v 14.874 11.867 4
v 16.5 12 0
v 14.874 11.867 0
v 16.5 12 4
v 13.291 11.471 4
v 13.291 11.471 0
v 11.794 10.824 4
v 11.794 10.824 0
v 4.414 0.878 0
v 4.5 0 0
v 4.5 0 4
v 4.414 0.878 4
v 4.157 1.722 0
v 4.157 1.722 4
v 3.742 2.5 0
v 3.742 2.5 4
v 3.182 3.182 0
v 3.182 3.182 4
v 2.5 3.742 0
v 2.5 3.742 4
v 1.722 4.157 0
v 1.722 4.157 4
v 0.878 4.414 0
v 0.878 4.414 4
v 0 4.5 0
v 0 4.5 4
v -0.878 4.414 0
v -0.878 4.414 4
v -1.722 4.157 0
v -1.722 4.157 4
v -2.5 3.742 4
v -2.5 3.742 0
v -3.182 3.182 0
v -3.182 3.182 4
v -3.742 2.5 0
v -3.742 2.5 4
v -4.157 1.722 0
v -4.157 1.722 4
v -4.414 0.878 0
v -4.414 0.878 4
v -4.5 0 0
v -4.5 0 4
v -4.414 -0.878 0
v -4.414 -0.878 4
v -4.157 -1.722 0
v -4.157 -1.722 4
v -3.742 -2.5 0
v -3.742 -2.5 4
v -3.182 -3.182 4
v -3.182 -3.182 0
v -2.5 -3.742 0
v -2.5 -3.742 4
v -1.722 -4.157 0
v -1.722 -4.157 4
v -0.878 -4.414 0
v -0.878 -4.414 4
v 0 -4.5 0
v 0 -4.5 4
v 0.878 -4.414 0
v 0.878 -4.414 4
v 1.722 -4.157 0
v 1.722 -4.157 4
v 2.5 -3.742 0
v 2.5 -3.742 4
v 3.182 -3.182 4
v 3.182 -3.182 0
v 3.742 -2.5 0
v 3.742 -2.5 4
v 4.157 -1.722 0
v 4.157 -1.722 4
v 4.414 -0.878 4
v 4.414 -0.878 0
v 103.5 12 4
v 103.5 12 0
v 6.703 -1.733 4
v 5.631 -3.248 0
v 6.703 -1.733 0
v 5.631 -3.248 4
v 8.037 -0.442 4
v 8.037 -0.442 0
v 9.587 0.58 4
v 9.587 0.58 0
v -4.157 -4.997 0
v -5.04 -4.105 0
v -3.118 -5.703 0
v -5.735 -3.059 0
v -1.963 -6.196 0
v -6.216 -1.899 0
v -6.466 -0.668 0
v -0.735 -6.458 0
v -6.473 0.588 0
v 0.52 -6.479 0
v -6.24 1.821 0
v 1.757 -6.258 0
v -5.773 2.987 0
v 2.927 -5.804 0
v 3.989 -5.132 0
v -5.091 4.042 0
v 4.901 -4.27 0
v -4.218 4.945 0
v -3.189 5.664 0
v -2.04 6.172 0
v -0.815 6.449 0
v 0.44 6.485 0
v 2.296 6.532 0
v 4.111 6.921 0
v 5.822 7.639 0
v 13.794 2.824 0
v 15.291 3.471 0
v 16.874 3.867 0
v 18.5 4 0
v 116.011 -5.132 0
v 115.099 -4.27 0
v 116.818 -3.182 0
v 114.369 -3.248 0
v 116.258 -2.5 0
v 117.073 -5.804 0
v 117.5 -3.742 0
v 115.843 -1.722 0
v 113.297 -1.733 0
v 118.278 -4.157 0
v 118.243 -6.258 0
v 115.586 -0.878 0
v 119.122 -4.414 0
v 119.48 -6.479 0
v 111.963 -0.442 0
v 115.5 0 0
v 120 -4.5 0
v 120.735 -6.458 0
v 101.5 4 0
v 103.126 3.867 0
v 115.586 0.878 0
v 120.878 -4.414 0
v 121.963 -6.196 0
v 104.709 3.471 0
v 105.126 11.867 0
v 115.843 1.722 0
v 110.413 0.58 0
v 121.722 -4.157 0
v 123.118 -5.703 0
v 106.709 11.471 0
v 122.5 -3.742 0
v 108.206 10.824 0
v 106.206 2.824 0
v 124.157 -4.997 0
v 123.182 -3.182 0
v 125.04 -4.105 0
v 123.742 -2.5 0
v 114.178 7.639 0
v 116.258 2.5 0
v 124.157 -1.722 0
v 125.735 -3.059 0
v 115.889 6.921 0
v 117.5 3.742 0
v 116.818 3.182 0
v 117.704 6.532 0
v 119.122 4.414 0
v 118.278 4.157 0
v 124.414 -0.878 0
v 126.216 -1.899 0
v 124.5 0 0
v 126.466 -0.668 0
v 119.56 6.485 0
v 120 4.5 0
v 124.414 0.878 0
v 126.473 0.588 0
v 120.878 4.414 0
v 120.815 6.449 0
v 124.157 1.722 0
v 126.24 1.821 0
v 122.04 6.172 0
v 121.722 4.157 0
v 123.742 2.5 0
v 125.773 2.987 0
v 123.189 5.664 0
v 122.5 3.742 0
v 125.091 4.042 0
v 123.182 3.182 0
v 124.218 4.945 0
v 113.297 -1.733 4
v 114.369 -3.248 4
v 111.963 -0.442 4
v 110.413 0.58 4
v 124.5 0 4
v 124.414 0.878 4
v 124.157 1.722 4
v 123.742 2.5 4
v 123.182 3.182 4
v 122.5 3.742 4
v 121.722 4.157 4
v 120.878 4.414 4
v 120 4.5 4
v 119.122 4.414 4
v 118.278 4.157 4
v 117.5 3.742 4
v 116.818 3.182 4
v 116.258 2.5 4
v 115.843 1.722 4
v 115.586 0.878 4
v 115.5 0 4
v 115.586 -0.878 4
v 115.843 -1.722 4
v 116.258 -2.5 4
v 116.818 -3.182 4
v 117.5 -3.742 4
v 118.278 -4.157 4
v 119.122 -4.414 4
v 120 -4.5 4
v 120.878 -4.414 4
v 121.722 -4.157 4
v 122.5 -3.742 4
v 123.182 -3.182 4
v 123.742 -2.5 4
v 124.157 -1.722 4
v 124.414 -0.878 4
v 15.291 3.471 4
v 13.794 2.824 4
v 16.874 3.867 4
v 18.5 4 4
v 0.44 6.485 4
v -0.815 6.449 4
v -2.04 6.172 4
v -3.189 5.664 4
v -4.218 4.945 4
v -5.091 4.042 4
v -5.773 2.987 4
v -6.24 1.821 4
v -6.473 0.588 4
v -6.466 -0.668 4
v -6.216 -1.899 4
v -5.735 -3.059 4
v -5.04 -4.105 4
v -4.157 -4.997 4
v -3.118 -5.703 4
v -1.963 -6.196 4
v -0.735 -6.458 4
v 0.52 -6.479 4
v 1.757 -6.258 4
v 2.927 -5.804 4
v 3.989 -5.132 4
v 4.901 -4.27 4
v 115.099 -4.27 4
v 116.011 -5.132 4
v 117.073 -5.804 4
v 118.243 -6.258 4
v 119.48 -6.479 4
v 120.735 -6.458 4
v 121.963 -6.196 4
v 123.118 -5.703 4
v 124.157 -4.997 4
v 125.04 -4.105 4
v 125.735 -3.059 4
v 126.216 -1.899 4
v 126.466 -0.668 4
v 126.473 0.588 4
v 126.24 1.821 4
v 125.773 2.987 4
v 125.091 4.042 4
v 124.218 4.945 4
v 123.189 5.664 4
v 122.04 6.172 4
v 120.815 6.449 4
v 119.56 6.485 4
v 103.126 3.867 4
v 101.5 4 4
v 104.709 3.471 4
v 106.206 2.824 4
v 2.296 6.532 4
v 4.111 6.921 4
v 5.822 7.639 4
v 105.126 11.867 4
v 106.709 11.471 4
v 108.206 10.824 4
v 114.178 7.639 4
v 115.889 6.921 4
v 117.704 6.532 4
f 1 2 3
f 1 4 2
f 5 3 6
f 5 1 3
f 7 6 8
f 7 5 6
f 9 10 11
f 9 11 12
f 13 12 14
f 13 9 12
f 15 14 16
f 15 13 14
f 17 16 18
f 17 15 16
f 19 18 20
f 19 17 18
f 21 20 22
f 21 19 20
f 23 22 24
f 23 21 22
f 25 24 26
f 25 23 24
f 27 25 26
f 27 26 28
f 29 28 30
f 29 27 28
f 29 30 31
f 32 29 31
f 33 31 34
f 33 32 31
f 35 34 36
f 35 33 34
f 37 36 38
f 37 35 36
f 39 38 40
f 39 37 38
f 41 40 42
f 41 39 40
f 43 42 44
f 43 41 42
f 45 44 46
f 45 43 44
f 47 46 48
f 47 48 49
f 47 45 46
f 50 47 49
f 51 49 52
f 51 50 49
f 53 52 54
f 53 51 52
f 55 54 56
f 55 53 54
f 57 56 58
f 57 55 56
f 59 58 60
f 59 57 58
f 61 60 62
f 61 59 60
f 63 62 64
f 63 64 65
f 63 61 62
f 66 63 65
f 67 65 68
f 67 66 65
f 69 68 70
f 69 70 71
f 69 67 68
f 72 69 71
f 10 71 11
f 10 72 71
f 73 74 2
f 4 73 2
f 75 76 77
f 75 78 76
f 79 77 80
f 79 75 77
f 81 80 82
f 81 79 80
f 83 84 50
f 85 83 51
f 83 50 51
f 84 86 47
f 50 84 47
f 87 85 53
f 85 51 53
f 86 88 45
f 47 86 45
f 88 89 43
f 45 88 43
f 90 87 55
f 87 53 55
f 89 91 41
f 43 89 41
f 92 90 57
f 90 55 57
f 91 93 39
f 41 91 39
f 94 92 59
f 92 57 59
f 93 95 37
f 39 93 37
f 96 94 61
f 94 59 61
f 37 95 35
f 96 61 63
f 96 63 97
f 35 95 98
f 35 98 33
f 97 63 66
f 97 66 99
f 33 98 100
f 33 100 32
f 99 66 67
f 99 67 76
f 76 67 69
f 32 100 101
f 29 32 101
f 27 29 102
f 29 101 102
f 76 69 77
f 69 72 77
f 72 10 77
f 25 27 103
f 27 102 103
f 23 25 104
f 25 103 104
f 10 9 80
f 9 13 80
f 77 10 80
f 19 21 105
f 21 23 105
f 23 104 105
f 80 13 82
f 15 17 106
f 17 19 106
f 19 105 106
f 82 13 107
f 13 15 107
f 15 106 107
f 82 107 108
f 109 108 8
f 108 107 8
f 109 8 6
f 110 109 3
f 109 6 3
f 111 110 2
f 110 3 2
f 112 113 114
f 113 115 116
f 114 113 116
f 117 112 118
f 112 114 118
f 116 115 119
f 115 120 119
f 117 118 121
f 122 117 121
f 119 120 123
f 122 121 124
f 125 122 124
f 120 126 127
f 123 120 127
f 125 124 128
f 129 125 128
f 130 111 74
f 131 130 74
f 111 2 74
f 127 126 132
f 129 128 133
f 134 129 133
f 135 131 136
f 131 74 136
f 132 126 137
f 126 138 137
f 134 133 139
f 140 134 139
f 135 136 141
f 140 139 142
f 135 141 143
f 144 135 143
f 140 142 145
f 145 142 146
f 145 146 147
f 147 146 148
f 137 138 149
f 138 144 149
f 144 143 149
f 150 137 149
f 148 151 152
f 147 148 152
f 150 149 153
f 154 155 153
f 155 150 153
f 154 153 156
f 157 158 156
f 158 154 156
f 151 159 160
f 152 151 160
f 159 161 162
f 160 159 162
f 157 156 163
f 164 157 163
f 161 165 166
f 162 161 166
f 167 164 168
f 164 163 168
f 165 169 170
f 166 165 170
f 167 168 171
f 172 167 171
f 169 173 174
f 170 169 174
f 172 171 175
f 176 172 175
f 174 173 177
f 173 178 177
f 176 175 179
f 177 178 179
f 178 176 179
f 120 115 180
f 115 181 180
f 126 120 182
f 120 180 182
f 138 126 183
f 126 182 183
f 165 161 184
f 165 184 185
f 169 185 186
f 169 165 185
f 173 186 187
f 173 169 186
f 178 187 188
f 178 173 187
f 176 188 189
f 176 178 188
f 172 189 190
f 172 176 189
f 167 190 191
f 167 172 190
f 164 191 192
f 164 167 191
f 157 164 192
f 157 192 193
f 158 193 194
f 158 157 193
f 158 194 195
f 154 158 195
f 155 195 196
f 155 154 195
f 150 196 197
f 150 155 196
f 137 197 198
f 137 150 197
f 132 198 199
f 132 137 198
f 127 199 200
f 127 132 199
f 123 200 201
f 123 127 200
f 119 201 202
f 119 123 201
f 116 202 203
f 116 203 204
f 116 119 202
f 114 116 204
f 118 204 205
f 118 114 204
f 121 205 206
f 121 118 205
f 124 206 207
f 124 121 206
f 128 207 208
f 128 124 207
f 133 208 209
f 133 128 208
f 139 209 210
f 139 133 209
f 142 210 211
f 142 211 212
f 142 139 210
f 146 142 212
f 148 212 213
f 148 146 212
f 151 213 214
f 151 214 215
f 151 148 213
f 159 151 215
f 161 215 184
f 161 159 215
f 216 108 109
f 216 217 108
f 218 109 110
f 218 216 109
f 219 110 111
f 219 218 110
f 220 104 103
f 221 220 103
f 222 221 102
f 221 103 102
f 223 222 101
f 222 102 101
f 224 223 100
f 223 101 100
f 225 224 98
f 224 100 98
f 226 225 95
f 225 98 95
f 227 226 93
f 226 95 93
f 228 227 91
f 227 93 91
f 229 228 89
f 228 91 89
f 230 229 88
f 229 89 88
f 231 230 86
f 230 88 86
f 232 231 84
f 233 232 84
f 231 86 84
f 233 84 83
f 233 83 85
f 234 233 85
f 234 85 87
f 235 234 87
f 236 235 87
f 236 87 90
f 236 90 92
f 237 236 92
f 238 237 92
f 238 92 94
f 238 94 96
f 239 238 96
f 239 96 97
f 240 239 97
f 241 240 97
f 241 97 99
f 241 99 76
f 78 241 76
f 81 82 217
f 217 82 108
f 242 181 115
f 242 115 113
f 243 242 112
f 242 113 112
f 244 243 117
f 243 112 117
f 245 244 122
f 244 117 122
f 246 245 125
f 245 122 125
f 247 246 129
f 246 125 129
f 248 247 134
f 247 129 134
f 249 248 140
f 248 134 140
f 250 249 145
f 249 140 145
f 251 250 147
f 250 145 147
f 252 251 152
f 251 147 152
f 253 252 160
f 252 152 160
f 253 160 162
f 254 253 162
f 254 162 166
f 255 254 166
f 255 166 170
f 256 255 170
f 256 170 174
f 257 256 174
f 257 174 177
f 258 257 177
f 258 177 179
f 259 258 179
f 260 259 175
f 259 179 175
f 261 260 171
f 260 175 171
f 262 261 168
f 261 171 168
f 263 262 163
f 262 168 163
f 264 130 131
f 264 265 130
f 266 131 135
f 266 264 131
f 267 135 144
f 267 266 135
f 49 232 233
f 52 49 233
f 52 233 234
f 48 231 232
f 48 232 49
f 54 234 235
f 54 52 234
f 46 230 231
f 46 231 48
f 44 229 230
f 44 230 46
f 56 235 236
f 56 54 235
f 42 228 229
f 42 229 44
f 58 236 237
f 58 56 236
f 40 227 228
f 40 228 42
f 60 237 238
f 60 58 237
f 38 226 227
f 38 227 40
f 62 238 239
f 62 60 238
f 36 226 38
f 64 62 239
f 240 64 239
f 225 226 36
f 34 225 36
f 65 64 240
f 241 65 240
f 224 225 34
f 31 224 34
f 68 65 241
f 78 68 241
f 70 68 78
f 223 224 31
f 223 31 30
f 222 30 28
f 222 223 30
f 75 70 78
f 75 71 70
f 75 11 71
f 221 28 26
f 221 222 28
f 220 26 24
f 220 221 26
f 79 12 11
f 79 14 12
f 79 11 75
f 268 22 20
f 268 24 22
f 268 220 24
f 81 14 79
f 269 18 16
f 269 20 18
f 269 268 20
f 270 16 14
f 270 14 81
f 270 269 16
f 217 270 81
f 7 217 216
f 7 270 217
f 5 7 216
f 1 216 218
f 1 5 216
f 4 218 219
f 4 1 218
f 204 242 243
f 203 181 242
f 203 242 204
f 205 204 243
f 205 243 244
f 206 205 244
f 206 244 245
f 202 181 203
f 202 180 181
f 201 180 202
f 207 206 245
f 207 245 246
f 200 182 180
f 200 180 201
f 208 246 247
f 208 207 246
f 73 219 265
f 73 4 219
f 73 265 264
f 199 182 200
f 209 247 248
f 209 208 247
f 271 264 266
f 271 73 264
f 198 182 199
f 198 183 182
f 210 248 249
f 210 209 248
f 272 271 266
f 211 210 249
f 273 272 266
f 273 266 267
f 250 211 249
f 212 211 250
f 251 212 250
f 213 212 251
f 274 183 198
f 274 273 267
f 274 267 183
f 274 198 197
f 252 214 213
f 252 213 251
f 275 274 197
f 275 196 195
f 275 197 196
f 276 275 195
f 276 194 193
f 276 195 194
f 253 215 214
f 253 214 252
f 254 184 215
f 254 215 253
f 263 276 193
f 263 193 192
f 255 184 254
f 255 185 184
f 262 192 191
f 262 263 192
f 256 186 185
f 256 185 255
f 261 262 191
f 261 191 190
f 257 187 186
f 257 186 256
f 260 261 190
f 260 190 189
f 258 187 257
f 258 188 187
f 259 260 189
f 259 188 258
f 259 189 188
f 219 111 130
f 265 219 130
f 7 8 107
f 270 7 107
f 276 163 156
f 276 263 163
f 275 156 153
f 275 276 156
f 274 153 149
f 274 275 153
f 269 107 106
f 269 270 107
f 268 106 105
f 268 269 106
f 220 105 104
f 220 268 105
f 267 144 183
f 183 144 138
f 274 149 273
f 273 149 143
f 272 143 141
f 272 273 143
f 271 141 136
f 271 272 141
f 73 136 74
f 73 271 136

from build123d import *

# Parameters (mm, degrees)
SKETCH1_R           = 6.5
SKETCH1_R_2         = 4.5
BOSS_EXTRUDE1_DEPTH = 4
FILLET1_R           = 10


with BuildPart() as part:
    # Sketch1 → Boss-Extrude1 (new body)
    # profile 1 of 3: a face of its own
    with BuildSketch(Plane.XY):
        with BuildLine():
            ThreePointArc((6.5, 0), (6.475721286, -0.561278744), (6.403066514, -1.118364526))
            Line((6.403066514, -1.118364526), (16, 4))
            Line((16, 4), (104, 4))
            Line((104, 4), (113.596933486, -1.118364526))
            ThreePointArc((113.596933486, -1.118364526), (114.264705882, 3.058823529), (117.361639368, 5.940459004))
            Line((117.361639368, 5.940459004), (106, 12))
            Line((106, 12), (14, 12))
            Line((14, 12), (2.638360632, 5.940459004))
            ThreePointArc((2.638360632, 5.940459004), (5.449740549, 3.542644203), (6.5, 0))
        make_face()
    # profile 2 of 3: a face of its own
    with BuildSketch(Plane.XY):
        Circle(SKETCH1_R)
        Circle(SKETCH1_R_2, mode=Mode.SUBTRACT)
    # profile 3 of 3: a face of its own
    with BuildSketch(Plane.XY):
        with Locations((120, 0)):
            Circle(SKETCH1_R)
        with Locations((120, 0)):
            Circle(SKETCH1_R_2, mode=Mode.SUBTRACT)
    extrude(amount=BOSS_EXTRUDE1_DEPTH)

    # Fillet1
    fillet1_edges = [part.edges().sort_by_distance(p)[0] for p in [
        (104, 4, 2),
        (16, 4, 2),
        (6.403066514, -1.118364526, 2),
        (2.638360632, 5.940459004, 2),
        (14, 12, 2),
        (106, 12, 2),
        (117.361639368, 5.940459004, 2),
        (113.596933486, -1.118364526, 2),
    ]]
    fillet(fillet1_edges, radius=FILLET1_R)


solid = part.part
